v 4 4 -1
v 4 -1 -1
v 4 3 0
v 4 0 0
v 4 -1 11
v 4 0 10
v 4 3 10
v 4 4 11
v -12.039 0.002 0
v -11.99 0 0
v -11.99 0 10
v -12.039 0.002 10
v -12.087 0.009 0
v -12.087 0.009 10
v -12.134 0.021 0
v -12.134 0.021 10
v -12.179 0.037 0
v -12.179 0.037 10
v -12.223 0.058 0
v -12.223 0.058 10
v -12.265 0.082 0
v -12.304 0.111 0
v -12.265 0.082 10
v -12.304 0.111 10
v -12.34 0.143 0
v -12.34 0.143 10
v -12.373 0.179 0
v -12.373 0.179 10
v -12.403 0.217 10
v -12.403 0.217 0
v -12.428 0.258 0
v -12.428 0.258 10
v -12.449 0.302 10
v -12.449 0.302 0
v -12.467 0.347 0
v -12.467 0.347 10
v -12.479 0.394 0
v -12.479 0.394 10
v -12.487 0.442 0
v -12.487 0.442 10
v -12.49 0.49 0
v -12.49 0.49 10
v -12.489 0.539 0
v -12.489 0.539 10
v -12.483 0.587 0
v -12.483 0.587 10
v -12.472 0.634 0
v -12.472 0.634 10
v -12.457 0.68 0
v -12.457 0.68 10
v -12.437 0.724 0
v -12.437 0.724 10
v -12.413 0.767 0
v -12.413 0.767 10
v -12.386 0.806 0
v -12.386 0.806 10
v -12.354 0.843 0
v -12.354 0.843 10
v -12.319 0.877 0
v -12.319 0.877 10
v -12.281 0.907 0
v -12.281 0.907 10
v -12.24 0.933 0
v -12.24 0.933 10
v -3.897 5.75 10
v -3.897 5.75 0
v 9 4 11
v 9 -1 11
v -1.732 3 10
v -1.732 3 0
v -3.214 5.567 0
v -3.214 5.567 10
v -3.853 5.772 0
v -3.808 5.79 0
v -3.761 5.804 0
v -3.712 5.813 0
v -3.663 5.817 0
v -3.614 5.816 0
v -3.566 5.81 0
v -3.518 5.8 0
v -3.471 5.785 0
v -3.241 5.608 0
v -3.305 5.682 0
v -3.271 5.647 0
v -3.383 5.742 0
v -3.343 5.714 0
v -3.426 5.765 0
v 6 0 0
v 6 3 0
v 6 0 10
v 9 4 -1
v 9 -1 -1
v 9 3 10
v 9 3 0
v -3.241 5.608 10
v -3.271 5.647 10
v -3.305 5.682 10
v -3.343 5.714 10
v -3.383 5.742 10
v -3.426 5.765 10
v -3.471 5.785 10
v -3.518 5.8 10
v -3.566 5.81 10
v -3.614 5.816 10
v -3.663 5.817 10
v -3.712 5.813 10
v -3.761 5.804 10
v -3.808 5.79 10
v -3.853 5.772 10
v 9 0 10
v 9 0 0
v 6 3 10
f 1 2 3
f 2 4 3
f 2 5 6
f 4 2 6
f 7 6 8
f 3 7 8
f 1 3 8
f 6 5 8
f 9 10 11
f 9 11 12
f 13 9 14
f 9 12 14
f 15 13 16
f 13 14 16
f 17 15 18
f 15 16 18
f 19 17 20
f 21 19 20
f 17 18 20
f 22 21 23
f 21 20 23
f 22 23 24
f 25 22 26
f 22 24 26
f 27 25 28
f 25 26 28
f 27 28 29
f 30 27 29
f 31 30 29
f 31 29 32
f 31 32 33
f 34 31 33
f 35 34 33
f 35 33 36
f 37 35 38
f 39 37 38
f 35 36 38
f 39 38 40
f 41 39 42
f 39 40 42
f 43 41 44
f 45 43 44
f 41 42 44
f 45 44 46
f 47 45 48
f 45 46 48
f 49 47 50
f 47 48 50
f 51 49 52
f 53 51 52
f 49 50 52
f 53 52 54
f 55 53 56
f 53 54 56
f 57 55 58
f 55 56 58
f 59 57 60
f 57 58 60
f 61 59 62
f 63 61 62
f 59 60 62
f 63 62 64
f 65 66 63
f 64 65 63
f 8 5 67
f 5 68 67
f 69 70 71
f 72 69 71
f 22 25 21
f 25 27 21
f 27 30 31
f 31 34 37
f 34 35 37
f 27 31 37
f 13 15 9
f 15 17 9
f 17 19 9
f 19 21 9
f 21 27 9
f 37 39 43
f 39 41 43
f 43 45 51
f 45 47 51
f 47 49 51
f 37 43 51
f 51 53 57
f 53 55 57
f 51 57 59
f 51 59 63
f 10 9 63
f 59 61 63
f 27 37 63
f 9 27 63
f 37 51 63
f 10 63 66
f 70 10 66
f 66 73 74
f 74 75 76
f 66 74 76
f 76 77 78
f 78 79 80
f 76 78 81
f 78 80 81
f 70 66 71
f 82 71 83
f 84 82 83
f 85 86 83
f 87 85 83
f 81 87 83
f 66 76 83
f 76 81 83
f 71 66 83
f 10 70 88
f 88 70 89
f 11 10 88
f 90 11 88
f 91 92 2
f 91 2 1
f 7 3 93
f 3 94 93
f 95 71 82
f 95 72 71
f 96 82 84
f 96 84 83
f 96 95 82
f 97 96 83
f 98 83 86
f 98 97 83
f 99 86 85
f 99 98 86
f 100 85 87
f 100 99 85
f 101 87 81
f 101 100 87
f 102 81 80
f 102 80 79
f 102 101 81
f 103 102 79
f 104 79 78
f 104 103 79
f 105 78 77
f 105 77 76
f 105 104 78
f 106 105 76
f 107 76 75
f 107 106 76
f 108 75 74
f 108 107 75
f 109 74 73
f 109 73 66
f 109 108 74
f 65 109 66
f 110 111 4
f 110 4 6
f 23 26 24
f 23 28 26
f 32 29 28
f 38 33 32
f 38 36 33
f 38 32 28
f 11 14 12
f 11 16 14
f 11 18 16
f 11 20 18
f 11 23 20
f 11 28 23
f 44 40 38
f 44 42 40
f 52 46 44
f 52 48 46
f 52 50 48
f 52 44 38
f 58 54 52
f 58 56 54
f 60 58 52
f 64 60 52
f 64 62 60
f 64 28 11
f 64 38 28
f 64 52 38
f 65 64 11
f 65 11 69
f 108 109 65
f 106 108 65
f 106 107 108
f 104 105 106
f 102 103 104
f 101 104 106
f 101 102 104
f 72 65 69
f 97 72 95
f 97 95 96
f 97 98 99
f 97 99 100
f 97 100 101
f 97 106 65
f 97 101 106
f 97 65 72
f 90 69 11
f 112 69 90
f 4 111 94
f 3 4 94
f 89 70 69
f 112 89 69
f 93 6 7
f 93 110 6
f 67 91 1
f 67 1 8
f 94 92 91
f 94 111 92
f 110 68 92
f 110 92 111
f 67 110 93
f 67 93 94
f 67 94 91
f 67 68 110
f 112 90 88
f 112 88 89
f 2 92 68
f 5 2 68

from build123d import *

# Parameters (mm, degrees)
F1_DEPTH      = 10
F3_W          = 3
F3_H          = 10
F4_DEPTH      = 9.464
F5_W          = 5
F5_H          = 12
F5_W_2        = 3
F5_H_2        = 10
F6_DEPTH      = 3
F6_DEPTH_BACK = 2
F7_R          = 0.5


with BuildPart() as f1:
    # F0 (on Top) → F1 (new body)
    with BuildSketch(Plane.XY):
        Polygon((-13.856406, 0), (0, 0), (-3.464102, 6), align=None)
    extrude(amount=F1_DEPTH)

    # F3 (on offset) → F4 (join)
    with BuildSketch(Plane.YZ.offset(-3.4643)):
        with Locations((1.5, 5)):
            Rectangle(F3_W, F3_H)
    extrude(amount=F4_DEPTH)

    # F7
    f7_edges = [f1.edges().sort_by_distance(p)[0] for p in [
        (-13.856406, 0, 5),
        (-3.464102, 6, 5),
    ]]
    fillet(f7_edges, radius=F7_R)


with BuildPart() as f6:
    # F5 (on face) → F6 (new body, two sides)
    with BuildSketch(Plane.YZ.offset(5.9997)) as f6_sk:
        with Locations((1.5, 5)):
            Rectangle(F5_W, F5_H)
        with Locations((1.5, 5)):
            Rectangle(F5_W_2, F5_H_2, mode=Mode.SUBTRACT)
    extrude(amount=F6_DEPTH)
    extrude(f6_sk.sketch, amount=-F6_DEPTH_BACK)


solid = Compound([f1.part, f6.part])
